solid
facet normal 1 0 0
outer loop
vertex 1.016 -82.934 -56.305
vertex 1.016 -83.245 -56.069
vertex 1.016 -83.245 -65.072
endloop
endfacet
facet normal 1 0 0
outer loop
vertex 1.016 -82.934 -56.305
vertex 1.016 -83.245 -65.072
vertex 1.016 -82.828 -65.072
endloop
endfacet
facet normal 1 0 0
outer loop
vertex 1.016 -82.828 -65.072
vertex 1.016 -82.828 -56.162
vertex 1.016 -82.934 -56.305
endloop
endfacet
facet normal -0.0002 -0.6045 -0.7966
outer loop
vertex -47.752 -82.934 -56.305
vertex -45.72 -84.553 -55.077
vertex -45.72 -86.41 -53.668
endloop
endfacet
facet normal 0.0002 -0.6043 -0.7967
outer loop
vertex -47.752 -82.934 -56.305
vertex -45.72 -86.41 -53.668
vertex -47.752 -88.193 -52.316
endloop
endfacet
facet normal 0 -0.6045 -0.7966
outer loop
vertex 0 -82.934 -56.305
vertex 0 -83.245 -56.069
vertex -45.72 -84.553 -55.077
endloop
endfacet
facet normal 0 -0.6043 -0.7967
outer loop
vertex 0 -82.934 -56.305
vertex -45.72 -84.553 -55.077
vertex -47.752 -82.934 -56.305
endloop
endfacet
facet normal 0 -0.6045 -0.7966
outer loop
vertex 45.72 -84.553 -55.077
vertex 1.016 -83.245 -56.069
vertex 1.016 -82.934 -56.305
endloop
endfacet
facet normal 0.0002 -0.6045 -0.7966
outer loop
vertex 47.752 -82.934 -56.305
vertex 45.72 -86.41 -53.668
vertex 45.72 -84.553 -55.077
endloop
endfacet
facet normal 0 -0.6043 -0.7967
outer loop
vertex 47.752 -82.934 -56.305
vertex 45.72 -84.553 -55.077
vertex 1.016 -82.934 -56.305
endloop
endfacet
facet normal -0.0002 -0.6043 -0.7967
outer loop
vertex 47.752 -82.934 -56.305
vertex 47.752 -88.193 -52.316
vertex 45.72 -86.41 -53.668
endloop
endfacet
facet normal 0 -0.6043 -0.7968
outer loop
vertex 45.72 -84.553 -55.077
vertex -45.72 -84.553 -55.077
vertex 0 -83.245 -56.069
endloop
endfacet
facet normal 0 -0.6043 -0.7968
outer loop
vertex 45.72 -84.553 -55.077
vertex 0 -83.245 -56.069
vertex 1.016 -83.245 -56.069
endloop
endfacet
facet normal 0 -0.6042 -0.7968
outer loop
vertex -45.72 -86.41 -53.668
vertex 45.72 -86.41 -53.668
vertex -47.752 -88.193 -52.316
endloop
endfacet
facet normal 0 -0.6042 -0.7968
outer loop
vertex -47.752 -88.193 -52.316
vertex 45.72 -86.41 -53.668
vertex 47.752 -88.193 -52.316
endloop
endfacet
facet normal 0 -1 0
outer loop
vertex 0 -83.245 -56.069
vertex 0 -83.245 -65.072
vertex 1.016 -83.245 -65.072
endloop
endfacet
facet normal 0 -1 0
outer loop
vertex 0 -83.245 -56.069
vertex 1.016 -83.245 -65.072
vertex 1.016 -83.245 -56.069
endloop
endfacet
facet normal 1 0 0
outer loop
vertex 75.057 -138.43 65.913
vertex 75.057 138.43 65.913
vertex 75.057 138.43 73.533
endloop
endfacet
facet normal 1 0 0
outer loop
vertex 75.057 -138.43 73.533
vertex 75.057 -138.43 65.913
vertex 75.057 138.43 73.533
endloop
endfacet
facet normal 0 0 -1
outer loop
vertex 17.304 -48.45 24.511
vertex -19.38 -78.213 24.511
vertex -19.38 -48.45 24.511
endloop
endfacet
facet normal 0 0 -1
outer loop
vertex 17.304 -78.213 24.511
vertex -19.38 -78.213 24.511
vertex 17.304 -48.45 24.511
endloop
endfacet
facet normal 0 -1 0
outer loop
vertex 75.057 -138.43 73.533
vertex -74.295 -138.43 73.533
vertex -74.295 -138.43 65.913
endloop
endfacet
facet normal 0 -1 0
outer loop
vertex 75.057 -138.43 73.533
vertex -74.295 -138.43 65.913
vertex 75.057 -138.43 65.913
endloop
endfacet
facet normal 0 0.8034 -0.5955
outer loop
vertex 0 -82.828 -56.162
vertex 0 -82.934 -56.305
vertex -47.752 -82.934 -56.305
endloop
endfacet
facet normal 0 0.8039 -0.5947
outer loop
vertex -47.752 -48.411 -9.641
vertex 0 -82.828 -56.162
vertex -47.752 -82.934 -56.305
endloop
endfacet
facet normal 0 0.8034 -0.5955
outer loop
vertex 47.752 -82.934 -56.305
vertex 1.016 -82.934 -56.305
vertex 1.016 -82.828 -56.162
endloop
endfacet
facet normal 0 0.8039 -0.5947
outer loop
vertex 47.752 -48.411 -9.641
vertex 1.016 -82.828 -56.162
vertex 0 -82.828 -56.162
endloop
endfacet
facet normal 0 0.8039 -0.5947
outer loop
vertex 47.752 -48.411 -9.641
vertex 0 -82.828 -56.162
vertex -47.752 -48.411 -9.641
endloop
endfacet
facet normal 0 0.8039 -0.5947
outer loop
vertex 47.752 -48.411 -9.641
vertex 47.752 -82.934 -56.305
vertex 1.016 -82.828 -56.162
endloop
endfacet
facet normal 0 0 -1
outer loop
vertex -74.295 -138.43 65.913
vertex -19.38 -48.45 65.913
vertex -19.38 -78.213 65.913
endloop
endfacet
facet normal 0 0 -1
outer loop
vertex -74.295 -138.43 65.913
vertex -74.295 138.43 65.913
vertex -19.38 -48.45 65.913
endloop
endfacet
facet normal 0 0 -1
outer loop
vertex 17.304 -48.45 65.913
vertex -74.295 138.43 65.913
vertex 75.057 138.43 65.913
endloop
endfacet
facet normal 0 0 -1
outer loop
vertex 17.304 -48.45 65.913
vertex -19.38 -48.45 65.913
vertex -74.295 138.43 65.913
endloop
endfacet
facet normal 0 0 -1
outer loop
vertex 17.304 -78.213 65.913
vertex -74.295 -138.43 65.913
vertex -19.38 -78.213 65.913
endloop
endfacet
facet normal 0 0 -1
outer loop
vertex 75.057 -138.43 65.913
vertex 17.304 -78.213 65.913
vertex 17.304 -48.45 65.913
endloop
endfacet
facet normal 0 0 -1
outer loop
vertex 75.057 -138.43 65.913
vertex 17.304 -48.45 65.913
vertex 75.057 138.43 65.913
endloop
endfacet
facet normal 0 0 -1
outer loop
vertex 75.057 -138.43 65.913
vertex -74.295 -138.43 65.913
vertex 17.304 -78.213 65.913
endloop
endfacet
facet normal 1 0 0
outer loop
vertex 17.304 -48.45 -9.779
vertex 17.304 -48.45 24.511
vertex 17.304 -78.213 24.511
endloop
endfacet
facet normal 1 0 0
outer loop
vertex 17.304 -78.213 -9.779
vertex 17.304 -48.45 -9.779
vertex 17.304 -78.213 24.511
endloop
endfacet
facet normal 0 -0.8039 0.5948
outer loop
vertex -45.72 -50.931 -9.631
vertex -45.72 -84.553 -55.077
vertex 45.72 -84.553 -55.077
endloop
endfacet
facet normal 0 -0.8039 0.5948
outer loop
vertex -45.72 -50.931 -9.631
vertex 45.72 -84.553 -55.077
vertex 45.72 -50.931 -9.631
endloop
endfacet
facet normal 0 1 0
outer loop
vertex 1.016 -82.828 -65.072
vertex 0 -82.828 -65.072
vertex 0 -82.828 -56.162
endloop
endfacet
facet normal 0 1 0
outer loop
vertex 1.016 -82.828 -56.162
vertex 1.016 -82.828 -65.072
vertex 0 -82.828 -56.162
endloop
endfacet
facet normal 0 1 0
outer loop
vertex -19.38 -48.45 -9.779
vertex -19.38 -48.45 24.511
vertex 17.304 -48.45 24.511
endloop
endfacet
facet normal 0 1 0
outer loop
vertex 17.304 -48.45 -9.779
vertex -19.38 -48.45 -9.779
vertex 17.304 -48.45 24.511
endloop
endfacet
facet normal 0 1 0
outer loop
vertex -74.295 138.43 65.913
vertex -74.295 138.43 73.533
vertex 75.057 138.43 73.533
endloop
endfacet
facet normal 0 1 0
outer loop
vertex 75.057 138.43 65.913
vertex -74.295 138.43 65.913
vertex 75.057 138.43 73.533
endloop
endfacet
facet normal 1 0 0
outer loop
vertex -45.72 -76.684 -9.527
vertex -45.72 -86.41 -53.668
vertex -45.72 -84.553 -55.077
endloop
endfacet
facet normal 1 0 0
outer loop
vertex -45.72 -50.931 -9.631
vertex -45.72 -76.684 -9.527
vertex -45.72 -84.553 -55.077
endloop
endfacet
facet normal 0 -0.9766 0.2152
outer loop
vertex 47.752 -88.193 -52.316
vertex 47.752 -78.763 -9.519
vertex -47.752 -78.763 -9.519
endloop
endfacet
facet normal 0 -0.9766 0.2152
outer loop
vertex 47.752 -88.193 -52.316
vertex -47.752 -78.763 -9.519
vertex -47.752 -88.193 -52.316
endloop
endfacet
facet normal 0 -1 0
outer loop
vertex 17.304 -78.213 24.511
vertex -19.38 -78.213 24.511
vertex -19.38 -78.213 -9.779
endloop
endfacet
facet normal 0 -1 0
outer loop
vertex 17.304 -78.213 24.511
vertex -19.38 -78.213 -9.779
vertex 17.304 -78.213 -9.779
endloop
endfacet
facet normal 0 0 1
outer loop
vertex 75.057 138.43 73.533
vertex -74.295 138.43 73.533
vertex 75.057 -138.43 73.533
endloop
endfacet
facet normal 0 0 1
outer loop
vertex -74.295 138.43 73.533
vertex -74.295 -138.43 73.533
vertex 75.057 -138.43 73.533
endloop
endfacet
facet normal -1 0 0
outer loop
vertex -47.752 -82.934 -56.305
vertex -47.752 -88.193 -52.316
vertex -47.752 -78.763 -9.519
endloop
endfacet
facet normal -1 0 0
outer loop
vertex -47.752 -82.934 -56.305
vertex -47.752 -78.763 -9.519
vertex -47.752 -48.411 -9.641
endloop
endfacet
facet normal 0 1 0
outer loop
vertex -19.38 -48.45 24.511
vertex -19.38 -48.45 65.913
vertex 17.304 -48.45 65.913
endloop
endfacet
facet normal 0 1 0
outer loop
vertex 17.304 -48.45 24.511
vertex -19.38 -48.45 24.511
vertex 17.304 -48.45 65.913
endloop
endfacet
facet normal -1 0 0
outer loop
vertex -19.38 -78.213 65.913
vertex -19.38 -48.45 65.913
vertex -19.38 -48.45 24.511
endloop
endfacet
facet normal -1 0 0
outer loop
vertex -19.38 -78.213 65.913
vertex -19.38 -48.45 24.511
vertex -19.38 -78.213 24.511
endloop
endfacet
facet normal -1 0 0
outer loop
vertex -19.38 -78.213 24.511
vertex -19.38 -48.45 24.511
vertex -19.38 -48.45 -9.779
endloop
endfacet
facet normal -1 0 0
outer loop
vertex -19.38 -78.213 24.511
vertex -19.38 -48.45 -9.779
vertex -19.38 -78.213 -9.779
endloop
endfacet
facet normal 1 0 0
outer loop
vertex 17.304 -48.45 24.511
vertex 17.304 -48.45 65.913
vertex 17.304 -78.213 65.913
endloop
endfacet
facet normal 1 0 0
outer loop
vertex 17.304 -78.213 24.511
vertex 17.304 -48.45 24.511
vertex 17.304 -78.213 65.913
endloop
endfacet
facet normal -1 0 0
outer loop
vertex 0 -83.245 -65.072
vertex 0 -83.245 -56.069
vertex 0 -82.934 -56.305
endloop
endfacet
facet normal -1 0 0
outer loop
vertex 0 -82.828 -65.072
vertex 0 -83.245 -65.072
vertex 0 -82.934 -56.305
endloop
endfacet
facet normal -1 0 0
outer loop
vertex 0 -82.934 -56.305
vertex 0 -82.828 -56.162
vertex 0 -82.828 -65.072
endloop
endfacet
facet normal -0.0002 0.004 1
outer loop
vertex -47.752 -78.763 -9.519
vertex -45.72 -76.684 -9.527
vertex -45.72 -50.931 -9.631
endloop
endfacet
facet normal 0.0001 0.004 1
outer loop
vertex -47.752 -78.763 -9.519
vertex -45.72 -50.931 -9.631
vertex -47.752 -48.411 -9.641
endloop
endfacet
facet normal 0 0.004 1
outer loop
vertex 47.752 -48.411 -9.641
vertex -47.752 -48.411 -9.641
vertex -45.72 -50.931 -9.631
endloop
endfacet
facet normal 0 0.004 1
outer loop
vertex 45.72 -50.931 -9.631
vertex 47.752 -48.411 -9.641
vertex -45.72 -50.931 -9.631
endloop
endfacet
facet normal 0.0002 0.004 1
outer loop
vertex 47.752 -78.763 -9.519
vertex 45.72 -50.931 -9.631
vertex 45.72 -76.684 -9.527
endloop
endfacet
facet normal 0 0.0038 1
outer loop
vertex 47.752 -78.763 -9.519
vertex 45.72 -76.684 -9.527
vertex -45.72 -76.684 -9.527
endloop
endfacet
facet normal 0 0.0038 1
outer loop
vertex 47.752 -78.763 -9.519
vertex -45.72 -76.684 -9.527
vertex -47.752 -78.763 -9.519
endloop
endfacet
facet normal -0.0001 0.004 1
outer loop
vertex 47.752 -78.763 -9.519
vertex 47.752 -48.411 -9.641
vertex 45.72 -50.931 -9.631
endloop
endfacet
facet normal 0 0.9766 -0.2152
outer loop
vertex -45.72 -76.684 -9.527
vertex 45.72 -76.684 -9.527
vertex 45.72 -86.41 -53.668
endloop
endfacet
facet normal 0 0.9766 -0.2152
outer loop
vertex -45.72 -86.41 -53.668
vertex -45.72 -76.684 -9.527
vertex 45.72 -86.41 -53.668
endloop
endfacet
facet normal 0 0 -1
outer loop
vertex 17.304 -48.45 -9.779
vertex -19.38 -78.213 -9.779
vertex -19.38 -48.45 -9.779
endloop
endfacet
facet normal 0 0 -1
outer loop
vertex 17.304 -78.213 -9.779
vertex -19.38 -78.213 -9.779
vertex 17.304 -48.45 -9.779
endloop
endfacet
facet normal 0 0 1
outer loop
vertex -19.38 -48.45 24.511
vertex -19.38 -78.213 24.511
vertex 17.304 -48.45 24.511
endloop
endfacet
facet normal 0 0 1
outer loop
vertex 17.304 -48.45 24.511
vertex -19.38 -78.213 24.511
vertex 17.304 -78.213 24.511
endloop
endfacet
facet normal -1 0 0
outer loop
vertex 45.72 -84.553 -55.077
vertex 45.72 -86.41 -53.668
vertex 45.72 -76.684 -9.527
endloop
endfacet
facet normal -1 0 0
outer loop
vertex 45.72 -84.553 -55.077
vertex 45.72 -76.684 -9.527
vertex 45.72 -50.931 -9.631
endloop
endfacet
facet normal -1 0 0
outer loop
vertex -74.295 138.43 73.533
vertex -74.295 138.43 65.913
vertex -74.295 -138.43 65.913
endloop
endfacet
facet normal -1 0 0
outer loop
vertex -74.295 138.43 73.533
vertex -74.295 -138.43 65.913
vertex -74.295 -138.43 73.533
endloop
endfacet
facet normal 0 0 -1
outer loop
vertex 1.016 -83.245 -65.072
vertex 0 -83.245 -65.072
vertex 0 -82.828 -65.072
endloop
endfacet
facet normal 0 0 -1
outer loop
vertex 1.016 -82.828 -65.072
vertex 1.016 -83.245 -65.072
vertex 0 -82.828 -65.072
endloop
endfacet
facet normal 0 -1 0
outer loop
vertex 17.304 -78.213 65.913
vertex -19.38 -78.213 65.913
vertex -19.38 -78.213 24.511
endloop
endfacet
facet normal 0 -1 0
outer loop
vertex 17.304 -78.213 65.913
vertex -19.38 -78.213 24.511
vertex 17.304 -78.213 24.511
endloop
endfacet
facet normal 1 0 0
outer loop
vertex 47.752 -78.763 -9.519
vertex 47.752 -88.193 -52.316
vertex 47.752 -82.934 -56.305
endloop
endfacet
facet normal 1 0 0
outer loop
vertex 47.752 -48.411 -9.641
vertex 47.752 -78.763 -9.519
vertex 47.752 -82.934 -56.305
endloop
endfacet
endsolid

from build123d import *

# Parameters (mm, degrees)
F0_W      = 149.3519991636
F0_H      = 7.6199993491
F1_DEPTH  = 138.43
F2_W      = 36.6839524359
F2_H      = 29.7624468803
F3_DEPTH  = 41.402
F4_W      = 36.6839524359
F4_H      = 29.7624468803
F5_DEPTH  = 34.29
F7_DEPTH  = 47.752
F8_T      = -2.032
F9_W      = 0.4168078303
F9_H      = 9.0326145291
F10_DEPTH = 1.016


with BuildPart() as f1:
    # F0 (on Front) → F1 (new body, symmetric)
    with BuildSketch(Plane.XZ):
        with Locations((0.38100034, 69.7229988873)):
            Rectangle(F0_W, F0_H)
    extrude(amount=F1_DEPTH, both=True)

    # F2 (on face) → F3 (join)
    with BuildSketch(Plane(origin=(0, 0, 65.9129992127), x_dir=(1, 0, 0), z_dir=(0, 0, -1))):
        with Locations((-1.0382244363, 63.3317232132)):
            Rectangle(F2_W, F2_H)
    extrude(amount=F3_DEPTH)


with BuildPart() as f5:
    # F4 (on face) → F5 (new body)
    with BuildSketch(Plane(origin=(0, 0, 24.5109992127), x_dir=(1, 0, 0), z_dir=(0, 0, -1))):
        with Locations((-1.0382244363, 63.3317232132)):
            Rectangle(F4_W, F4_H)
    extrude(amount=F5_DEPTH)


with BuildPart() as f7:
    # F6 (on Right) → F7 (new body, symmetric)
    with BuildSketch(Plane.YZ):
        Polygon((-48.411320895, -9.6413381398), (-78.7627846003, -9.518545121), (-88.1926491857, -52.3156262934), (-82.9336866736, -56.3051849604), align=None)
    extrude(amount=F7_DEPTH, both=True)

    # F8
    f8_openings = [f7.faces().sort_by_distance(p)[0] for p in [
        (0, -85.563168, -54.310406),
        (0, -63.587053, -9.579942),
    ]]
    offset(amount=F8_T, openings=f8_openings)

    # F9 (on Right) → F10 (join)
    with BuildSketch(Plane.YZ):
        with Locations((-83.036404103, -60.5554915965)):
            Rectangle(F9_W, F9_H)
    extrude(amount=F10_DEPTH)


solid = Compound([f1.part, f5.part, f7.part])
